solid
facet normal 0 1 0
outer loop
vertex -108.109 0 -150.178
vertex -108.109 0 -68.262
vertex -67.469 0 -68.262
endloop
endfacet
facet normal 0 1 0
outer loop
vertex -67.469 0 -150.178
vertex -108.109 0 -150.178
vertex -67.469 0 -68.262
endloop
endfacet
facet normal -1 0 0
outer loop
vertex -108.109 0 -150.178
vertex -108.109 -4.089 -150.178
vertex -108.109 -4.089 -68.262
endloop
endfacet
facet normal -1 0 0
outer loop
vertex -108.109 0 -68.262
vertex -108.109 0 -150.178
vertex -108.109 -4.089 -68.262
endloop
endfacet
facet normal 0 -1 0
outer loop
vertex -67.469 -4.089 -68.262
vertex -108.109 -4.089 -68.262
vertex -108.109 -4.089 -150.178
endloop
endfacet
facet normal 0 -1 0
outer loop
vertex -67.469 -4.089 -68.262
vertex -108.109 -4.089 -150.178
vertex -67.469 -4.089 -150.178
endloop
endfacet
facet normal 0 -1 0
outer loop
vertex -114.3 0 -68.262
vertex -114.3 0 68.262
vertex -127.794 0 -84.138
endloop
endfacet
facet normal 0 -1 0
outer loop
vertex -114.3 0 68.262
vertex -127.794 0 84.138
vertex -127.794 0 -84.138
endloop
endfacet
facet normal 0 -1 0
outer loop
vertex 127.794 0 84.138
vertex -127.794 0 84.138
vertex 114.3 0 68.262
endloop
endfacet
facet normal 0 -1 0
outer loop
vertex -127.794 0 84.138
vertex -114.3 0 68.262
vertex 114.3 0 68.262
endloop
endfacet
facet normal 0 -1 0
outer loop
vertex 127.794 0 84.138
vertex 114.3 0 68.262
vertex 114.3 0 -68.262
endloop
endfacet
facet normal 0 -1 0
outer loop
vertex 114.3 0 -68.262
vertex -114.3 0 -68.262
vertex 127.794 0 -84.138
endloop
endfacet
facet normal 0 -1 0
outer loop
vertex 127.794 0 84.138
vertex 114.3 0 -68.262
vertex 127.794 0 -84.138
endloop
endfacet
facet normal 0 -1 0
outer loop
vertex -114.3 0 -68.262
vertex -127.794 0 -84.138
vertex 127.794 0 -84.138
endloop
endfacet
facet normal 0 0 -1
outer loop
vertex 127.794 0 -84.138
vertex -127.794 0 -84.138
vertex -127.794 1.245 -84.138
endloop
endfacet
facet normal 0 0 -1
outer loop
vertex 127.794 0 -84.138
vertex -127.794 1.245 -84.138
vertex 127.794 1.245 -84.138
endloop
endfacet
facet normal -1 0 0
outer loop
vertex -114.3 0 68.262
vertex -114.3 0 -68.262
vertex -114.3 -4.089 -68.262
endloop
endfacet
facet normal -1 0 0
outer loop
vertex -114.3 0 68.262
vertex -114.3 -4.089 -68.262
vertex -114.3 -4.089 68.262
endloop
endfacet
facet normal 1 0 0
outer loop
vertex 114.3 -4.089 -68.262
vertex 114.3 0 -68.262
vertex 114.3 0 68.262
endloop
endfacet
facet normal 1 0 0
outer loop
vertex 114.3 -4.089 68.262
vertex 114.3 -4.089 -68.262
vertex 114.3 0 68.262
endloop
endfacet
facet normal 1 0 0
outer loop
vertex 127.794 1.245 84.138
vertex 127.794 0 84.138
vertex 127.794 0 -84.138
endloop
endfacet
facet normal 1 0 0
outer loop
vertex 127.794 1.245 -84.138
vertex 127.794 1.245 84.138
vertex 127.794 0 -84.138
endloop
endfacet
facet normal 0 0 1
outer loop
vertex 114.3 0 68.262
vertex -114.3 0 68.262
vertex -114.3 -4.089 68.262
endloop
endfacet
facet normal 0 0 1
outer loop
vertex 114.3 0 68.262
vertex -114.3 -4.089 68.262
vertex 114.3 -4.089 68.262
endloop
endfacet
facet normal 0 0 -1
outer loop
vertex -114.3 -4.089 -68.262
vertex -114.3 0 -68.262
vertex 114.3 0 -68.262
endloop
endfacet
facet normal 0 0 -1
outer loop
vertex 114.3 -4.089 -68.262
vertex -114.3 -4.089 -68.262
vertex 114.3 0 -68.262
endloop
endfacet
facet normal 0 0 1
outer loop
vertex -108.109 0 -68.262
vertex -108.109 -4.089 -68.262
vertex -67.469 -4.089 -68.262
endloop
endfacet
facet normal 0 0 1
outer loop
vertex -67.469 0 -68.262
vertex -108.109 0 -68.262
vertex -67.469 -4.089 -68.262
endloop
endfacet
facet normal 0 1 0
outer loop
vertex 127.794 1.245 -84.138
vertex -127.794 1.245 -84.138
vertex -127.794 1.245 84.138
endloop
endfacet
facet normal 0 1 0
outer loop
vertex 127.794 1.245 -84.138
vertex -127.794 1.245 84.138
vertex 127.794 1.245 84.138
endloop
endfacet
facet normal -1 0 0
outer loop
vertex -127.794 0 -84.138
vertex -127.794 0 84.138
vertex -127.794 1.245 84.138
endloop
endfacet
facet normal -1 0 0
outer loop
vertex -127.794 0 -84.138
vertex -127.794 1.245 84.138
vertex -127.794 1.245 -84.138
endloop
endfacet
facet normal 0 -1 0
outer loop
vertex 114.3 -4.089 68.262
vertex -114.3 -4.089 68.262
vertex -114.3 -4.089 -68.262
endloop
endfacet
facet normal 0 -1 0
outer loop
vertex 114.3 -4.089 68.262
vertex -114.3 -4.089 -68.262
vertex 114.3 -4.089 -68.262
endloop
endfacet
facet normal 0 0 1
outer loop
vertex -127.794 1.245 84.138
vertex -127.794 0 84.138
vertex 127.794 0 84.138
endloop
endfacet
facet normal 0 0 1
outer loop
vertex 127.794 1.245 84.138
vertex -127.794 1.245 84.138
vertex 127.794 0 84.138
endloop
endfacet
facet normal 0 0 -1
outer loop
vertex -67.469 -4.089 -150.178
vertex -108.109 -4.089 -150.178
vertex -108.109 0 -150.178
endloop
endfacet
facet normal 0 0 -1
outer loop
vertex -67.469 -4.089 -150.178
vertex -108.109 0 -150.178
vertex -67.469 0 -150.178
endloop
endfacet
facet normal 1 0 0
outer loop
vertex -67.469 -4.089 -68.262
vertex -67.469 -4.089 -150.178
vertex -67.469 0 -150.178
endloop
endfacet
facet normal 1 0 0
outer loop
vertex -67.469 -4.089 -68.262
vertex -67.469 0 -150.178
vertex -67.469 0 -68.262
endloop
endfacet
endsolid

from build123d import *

# Parameters (mm, degrees)
SKETCH1_W           = 255.5875
SKETCH1_H           = 168.275
BOSS_EXTRUDE1_DEPTH = 1.2446
SKETCH2_W           = 228.6
SKETCH2_H           = 136.525
BOSS_EXTRUDE2_DEPTH = 4.0894
SKETCH3_W           = 40.64
SKETCH3_H           = 81.915
CABLE_DEPTH         = 4.0894


with BuildPart() as part:
    # Sketch1 → Boss-Extrude1 (new body)
    with BuildSketch(Plane(origin=(0, 0, 0), x_dir=(1, 0, 0), z_dir=(0, 1, 0))):
        Rectangle(SKETCH1_W, SKETCH1_H)
    extrude(amount=BOSS_EXTRUDE1_DEPTH)

    # Sketch2 → Boss-Extrude2 (add)
    with BuildSketch(Plane.XZ):
        Rectangle(SKETCH2_W, SKETCH2_H)
    extrude(amount=BOSS_EXTRUDE2_DEPTH)


with BuildPart() as body_2:
    # Sketch3 → Cable (new body)
    with BuildSketch(Plane.XZ.offset(4.0894)):
        with Locations((-87.78875, -109.22)):
            Rectangle(SKETCH3_W, SKETCH3_H)
    extrude(amount=-CABLE_DEPTH)


solid = Compound([part.part, body_2.part])
